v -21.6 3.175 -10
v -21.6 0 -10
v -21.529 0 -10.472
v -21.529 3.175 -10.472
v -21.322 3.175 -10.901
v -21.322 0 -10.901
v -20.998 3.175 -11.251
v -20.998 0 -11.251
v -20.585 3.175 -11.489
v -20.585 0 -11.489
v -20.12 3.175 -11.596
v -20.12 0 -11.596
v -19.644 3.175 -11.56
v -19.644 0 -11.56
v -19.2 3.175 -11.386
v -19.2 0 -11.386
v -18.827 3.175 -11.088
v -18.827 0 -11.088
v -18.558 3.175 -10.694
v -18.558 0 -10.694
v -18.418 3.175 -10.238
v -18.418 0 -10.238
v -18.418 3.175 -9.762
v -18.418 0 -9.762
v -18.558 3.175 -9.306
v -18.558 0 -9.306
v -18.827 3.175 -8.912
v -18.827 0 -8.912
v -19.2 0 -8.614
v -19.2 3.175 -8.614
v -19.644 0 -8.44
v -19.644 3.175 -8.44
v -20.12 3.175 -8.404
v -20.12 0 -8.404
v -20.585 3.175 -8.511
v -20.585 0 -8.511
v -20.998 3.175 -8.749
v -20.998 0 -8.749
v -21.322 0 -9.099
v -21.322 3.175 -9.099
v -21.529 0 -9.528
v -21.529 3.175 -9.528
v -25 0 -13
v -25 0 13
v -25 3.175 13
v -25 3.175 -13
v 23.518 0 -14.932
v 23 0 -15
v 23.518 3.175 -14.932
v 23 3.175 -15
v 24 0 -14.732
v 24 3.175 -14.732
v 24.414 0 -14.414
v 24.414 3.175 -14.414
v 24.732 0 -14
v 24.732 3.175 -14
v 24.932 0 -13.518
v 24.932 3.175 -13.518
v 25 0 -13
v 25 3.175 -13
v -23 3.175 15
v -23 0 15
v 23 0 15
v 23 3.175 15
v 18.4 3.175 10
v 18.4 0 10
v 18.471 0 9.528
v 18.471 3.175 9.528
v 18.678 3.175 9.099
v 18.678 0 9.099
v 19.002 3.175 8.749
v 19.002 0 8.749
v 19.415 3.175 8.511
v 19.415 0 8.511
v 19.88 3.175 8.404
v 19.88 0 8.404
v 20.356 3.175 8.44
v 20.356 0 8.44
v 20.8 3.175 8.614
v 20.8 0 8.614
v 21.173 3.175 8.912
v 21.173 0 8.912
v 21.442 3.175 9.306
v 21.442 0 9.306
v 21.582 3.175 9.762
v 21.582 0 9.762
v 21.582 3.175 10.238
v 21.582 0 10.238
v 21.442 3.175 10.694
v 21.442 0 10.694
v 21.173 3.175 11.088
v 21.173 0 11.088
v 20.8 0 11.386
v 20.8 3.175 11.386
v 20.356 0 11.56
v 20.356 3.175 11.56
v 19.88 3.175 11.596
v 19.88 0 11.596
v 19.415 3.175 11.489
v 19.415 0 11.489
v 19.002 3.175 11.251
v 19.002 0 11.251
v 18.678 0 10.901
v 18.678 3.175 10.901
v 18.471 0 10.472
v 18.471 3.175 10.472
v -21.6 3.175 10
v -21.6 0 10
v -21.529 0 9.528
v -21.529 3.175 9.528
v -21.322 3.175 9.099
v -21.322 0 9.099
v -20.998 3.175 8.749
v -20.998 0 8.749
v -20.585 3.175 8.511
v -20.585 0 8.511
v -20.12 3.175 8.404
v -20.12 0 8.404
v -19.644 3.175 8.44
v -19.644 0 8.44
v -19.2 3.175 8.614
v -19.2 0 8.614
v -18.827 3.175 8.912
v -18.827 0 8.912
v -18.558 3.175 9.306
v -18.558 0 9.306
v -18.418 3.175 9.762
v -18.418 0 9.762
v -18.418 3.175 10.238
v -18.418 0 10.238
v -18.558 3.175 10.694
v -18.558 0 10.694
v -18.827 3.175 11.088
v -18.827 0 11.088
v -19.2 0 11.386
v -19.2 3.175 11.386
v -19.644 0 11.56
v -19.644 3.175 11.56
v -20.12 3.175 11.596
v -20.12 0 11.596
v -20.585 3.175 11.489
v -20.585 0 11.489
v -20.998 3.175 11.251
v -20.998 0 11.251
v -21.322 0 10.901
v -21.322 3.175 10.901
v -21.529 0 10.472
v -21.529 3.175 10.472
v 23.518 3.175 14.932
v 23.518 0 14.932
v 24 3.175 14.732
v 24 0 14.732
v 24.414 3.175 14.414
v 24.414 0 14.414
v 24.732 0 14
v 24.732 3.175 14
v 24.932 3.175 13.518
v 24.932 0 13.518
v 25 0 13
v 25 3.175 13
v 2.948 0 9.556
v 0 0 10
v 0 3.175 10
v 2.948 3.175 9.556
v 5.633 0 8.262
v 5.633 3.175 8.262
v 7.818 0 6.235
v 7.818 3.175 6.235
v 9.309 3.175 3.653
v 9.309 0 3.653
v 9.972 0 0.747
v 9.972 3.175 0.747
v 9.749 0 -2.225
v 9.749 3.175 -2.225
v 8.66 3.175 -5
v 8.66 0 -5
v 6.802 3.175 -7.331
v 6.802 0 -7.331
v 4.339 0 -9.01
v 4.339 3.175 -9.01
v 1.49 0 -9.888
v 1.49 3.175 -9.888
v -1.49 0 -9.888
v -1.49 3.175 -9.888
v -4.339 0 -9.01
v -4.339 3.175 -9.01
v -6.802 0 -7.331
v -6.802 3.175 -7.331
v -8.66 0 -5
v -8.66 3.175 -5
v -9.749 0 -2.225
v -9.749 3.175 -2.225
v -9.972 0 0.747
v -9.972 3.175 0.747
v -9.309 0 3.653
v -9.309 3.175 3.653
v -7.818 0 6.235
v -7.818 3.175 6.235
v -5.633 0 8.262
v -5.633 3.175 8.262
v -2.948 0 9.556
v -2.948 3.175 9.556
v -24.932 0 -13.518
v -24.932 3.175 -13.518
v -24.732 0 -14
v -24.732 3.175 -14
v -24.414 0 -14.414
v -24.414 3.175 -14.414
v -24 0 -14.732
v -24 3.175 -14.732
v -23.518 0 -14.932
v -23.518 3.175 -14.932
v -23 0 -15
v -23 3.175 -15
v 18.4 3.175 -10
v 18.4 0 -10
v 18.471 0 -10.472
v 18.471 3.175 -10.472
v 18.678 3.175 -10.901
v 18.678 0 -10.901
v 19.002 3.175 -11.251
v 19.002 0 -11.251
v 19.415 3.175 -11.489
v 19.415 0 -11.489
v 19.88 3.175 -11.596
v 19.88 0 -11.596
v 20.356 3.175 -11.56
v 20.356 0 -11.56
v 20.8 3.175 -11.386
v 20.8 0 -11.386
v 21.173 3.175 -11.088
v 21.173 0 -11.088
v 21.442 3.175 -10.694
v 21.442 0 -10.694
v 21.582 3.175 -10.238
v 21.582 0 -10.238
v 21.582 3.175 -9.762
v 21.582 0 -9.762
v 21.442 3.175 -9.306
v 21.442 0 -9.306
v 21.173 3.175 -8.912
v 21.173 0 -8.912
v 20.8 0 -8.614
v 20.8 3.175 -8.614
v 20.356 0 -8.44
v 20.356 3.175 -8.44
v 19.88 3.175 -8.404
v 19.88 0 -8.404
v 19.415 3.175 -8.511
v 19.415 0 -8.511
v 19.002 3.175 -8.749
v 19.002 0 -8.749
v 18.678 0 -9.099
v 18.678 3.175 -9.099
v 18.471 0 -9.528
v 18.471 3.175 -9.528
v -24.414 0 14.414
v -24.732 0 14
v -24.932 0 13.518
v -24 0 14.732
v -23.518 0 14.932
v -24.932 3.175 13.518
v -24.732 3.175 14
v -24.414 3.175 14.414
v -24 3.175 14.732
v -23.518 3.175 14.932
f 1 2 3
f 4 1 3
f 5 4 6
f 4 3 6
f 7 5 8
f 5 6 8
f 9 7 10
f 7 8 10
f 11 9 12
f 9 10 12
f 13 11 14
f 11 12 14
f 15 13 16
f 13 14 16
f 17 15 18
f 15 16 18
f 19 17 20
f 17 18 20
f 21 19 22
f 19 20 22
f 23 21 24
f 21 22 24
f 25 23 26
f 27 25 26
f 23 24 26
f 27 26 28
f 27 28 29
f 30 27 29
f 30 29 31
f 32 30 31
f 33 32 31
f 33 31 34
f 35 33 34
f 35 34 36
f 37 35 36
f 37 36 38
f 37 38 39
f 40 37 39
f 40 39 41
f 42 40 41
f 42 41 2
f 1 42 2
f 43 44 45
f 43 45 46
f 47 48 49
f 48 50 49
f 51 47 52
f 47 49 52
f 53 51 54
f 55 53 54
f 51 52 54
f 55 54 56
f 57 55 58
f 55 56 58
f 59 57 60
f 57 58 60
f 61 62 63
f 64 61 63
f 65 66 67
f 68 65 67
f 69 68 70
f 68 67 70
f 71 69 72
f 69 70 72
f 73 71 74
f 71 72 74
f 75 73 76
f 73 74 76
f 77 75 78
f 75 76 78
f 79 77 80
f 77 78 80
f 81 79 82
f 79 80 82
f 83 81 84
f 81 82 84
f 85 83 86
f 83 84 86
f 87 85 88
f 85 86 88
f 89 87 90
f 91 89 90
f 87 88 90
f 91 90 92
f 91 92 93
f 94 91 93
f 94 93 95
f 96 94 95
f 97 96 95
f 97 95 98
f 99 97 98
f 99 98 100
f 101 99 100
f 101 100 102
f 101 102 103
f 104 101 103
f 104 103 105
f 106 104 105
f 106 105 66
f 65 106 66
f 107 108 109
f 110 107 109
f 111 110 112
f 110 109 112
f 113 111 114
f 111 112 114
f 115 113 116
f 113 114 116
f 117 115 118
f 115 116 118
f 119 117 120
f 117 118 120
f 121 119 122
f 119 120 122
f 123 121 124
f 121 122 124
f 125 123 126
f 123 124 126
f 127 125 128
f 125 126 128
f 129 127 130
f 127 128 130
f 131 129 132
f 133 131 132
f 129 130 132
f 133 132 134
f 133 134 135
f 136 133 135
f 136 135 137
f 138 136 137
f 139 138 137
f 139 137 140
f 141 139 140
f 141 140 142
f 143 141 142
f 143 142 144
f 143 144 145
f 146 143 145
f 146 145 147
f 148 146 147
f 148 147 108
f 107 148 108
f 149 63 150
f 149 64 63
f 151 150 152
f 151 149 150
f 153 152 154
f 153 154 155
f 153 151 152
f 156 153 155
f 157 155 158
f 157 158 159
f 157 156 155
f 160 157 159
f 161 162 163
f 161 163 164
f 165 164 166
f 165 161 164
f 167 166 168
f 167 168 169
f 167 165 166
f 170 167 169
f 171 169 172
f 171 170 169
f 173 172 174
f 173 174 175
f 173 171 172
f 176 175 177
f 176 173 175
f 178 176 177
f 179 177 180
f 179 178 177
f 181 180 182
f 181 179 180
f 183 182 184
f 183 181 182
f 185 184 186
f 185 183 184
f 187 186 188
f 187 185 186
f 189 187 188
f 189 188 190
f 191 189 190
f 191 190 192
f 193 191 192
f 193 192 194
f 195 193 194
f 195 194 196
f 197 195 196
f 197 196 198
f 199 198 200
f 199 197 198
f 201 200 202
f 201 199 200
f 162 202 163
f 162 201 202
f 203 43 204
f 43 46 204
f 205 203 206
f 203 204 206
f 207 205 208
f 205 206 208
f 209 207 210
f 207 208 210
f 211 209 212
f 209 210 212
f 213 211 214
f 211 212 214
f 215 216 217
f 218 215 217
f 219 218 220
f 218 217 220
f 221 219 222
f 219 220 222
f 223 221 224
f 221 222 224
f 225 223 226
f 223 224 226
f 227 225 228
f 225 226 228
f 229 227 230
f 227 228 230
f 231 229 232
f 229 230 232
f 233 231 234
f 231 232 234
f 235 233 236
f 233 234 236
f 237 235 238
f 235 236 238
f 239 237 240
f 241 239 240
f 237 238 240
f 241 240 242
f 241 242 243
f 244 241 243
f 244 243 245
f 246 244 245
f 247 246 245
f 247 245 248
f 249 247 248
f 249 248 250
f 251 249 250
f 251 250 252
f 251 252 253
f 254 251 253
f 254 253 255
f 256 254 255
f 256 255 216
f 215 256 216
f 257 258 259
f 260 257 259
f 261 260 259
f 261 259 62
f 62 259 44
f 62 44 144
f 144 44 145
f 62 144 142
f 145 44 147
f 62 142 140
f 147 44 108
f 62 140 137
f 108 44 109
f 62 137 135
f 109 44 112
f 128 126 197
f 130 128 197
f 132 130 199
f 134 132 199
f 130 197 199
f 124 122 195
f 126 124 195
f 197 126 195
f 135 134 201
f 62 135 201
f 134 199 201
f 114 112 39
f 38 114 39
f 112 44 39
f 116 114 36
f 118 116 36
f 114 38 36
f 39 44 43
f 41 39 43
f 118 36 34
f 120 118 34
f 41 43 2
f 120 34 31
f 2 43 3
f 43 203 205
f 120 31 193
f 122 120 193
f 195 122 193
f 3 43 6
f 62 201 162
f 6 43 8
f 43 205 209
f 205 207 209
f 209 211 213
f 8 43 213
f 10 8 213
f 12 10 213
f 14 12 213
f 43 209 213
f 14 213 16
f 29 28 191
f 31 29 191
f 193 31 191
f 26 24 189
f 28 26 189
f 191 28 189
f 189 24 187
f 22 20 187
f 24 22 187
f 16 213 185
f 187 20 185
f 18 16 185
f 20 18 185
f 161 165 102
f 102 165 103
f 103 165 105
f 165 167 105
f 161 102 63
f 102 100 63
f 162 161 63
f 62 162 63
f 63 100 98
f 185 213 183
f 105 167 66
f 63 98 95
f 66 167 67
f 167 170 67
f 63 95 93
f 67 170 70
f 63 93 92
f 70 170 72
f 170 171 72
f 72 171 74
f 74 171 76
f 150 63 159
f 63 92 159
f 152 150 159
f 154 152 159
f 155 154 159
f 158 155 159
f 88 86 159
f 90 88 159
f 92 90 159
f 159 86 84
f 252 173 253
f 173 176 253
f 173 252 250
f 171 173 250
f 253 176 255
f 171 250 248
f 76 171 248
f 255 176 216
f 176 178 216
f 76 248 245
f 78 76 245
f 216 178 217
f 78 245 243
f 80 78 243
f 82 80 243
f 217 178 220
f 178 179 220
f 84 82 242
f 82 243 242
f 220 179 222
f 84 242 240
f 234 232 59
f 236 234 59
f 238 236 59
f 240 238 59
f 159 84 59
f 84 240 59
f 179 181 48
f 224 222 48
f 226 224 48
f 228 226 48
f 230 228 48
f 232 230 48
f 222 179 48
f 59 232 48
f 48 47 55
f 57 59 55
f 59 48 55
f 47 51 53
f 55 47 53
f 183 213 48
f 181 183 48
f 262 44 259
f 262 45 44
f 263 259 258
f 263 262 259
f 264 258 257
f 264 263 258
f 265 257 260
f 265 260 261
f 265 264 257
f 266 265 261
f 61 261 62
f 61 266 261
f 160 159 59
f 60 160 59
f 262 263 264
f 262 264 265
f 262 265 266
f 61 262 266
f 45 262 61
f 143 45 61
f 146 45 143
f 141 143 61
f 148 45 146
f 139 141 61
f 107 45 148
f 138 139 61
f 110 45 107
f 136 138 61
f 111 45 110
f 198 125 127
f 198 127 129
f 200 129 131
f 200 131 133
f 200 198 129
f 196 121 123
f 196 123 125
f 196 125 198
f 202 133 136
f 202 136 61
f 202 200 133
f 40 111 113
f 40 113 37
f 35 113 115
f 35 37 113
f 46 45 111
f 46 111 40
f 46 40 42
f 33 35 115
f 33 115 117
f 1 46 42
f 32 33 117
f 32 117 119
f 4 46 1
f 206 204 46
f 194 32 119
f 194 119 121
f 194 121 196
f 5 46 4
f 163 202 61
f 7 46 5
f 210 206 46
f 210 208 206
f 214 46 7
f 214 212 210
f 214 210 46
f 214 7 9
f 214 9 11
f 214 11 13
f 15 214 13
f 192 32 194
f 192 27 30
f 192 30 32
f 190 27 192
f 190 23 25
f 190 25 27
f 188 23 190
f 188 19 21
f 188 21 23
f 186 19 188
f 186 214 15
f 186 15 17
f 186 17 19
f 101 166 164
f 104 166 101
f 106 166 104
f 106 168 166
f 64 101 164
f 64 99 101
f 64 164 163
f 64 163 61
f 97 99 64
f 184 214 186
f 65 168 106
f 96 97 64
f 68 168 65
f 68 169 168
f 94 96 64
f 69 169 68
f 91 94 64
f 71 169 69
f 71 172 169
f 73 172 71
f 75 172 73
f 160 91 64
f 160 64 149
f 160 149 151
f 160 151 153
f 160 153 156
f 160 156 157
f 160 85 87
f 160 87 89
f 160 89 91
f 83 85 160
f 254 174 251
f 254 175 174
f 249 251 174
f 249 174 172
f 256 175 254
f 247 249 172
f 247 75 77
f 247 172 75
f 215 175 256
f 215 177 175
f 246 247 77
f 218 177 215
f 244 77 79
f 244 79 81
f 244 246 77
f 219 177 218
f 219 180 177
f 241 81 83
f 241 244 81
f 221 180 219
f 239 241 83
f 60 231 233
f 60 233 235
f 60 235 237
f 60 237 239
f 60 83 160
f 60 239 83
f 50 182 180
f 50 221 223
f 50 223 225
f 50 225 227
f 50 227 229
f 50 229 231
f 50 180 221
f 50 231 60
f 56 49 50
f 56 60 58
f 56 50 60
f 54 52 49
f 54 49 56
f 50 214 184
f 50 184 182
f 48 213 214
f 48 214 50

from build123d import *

# Parameters (mm, degrees)
SKETCH1_W                = 50
SKETCH1_H                = 30
SKETCH1_R                = 10
BOSS_EXTRUDE1_DEPTH      = 3.175
M3_CLEARANCE_HOLE1_D     = 3.2
M3_CLEARANCE_HOLE1_DEPTH = 3.175
FILLET1_R                = 2


with BuildPart() as part:
    # Sketch1 → Boss-Extrude1 (new body)
    with BuildSketch(Plane(origin=(0, 0, 0), x_dir=(1, 0, 0), z_dir=(0, 1, 0))):
        Rectangle(SKETCH1_W, SKETCH1_H)
        with Locations(Location((0, 0, 0), (0, 0, 270))):
            Circle(SKETCH1_R, mode=Mode.SUBTRACT)
    extrude(amount=BOSS_EXTRUDE1_DEPTH)

    # M3 Clearance Hole1
    with Locations(Plane(origin=(0, 3.175, 0), x_dir=(1, 0, 0), z_dir=(0, 1, 0))):
        with Locations((0, 0), (-20, 10), (20, -10), (20, 10), (-20, -10)):
            Hole(M3_CLEARANCE_HOLE1_D / 2, depth=M3_CLEARANCE_HOLE1_DEPTH)

    # Fillet1
    fillet1_edges = [part.edges().sort_by_distance(p)[0] for p in [
        (-25, 1.5875, -15),
        (25, 1.5875, -15),
        (25, 1.5875, 15),
        (-25, 1.5875, 15),
    ]]
    fillet(fillet1_edges, radius=FILLET1_R)


solid = part.part
